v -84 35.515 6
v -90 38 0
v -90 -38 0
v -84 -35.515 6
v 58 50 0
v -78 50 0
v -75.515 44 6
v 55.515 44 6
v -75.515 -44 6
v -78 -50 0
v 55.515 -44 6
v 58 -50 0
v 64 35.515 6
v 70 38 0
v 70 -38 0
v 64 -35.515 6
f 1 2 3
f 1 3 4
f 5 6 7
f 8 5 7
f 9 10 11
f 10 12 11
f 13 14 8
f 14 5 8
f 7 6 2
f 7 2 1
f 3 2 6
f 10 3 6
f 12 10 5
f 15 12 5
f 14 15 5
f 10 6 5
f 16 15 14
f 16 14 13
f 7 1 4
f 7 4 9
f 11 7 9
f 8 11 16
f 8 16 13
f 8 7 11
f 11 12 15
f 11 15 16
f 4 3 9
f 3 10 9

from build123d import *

# Parameters (mm, degrees)
SLOPED_45DEG_ROOF_FLAT_WEBCAM_TOP_DEPTH = 6
SLOPED_45DEG_ROOF_FLAT_WEBCAM_TOP_TAPER = 45


with BuildPart() as part:
    # Sketch1 → Sloped_45deg_Roof_Flat_Webcam_Top (new body)
    with BuildSketch(Plane.XY):
        Polygon((-78, -50), (58, -50), (70, -38), (70, 38), (58, 50), (-78, 50), (-90, 38), (-90, -38), align=None)
    extrude(amount=SLOPED_45DEG_ROOF_FLAT_WEBCAM_TOP_DEPTH, taper=SLOPED_45DEG_ROOF_FLAT_WEBCAM_TOP_TAPER)


solid = part.part
